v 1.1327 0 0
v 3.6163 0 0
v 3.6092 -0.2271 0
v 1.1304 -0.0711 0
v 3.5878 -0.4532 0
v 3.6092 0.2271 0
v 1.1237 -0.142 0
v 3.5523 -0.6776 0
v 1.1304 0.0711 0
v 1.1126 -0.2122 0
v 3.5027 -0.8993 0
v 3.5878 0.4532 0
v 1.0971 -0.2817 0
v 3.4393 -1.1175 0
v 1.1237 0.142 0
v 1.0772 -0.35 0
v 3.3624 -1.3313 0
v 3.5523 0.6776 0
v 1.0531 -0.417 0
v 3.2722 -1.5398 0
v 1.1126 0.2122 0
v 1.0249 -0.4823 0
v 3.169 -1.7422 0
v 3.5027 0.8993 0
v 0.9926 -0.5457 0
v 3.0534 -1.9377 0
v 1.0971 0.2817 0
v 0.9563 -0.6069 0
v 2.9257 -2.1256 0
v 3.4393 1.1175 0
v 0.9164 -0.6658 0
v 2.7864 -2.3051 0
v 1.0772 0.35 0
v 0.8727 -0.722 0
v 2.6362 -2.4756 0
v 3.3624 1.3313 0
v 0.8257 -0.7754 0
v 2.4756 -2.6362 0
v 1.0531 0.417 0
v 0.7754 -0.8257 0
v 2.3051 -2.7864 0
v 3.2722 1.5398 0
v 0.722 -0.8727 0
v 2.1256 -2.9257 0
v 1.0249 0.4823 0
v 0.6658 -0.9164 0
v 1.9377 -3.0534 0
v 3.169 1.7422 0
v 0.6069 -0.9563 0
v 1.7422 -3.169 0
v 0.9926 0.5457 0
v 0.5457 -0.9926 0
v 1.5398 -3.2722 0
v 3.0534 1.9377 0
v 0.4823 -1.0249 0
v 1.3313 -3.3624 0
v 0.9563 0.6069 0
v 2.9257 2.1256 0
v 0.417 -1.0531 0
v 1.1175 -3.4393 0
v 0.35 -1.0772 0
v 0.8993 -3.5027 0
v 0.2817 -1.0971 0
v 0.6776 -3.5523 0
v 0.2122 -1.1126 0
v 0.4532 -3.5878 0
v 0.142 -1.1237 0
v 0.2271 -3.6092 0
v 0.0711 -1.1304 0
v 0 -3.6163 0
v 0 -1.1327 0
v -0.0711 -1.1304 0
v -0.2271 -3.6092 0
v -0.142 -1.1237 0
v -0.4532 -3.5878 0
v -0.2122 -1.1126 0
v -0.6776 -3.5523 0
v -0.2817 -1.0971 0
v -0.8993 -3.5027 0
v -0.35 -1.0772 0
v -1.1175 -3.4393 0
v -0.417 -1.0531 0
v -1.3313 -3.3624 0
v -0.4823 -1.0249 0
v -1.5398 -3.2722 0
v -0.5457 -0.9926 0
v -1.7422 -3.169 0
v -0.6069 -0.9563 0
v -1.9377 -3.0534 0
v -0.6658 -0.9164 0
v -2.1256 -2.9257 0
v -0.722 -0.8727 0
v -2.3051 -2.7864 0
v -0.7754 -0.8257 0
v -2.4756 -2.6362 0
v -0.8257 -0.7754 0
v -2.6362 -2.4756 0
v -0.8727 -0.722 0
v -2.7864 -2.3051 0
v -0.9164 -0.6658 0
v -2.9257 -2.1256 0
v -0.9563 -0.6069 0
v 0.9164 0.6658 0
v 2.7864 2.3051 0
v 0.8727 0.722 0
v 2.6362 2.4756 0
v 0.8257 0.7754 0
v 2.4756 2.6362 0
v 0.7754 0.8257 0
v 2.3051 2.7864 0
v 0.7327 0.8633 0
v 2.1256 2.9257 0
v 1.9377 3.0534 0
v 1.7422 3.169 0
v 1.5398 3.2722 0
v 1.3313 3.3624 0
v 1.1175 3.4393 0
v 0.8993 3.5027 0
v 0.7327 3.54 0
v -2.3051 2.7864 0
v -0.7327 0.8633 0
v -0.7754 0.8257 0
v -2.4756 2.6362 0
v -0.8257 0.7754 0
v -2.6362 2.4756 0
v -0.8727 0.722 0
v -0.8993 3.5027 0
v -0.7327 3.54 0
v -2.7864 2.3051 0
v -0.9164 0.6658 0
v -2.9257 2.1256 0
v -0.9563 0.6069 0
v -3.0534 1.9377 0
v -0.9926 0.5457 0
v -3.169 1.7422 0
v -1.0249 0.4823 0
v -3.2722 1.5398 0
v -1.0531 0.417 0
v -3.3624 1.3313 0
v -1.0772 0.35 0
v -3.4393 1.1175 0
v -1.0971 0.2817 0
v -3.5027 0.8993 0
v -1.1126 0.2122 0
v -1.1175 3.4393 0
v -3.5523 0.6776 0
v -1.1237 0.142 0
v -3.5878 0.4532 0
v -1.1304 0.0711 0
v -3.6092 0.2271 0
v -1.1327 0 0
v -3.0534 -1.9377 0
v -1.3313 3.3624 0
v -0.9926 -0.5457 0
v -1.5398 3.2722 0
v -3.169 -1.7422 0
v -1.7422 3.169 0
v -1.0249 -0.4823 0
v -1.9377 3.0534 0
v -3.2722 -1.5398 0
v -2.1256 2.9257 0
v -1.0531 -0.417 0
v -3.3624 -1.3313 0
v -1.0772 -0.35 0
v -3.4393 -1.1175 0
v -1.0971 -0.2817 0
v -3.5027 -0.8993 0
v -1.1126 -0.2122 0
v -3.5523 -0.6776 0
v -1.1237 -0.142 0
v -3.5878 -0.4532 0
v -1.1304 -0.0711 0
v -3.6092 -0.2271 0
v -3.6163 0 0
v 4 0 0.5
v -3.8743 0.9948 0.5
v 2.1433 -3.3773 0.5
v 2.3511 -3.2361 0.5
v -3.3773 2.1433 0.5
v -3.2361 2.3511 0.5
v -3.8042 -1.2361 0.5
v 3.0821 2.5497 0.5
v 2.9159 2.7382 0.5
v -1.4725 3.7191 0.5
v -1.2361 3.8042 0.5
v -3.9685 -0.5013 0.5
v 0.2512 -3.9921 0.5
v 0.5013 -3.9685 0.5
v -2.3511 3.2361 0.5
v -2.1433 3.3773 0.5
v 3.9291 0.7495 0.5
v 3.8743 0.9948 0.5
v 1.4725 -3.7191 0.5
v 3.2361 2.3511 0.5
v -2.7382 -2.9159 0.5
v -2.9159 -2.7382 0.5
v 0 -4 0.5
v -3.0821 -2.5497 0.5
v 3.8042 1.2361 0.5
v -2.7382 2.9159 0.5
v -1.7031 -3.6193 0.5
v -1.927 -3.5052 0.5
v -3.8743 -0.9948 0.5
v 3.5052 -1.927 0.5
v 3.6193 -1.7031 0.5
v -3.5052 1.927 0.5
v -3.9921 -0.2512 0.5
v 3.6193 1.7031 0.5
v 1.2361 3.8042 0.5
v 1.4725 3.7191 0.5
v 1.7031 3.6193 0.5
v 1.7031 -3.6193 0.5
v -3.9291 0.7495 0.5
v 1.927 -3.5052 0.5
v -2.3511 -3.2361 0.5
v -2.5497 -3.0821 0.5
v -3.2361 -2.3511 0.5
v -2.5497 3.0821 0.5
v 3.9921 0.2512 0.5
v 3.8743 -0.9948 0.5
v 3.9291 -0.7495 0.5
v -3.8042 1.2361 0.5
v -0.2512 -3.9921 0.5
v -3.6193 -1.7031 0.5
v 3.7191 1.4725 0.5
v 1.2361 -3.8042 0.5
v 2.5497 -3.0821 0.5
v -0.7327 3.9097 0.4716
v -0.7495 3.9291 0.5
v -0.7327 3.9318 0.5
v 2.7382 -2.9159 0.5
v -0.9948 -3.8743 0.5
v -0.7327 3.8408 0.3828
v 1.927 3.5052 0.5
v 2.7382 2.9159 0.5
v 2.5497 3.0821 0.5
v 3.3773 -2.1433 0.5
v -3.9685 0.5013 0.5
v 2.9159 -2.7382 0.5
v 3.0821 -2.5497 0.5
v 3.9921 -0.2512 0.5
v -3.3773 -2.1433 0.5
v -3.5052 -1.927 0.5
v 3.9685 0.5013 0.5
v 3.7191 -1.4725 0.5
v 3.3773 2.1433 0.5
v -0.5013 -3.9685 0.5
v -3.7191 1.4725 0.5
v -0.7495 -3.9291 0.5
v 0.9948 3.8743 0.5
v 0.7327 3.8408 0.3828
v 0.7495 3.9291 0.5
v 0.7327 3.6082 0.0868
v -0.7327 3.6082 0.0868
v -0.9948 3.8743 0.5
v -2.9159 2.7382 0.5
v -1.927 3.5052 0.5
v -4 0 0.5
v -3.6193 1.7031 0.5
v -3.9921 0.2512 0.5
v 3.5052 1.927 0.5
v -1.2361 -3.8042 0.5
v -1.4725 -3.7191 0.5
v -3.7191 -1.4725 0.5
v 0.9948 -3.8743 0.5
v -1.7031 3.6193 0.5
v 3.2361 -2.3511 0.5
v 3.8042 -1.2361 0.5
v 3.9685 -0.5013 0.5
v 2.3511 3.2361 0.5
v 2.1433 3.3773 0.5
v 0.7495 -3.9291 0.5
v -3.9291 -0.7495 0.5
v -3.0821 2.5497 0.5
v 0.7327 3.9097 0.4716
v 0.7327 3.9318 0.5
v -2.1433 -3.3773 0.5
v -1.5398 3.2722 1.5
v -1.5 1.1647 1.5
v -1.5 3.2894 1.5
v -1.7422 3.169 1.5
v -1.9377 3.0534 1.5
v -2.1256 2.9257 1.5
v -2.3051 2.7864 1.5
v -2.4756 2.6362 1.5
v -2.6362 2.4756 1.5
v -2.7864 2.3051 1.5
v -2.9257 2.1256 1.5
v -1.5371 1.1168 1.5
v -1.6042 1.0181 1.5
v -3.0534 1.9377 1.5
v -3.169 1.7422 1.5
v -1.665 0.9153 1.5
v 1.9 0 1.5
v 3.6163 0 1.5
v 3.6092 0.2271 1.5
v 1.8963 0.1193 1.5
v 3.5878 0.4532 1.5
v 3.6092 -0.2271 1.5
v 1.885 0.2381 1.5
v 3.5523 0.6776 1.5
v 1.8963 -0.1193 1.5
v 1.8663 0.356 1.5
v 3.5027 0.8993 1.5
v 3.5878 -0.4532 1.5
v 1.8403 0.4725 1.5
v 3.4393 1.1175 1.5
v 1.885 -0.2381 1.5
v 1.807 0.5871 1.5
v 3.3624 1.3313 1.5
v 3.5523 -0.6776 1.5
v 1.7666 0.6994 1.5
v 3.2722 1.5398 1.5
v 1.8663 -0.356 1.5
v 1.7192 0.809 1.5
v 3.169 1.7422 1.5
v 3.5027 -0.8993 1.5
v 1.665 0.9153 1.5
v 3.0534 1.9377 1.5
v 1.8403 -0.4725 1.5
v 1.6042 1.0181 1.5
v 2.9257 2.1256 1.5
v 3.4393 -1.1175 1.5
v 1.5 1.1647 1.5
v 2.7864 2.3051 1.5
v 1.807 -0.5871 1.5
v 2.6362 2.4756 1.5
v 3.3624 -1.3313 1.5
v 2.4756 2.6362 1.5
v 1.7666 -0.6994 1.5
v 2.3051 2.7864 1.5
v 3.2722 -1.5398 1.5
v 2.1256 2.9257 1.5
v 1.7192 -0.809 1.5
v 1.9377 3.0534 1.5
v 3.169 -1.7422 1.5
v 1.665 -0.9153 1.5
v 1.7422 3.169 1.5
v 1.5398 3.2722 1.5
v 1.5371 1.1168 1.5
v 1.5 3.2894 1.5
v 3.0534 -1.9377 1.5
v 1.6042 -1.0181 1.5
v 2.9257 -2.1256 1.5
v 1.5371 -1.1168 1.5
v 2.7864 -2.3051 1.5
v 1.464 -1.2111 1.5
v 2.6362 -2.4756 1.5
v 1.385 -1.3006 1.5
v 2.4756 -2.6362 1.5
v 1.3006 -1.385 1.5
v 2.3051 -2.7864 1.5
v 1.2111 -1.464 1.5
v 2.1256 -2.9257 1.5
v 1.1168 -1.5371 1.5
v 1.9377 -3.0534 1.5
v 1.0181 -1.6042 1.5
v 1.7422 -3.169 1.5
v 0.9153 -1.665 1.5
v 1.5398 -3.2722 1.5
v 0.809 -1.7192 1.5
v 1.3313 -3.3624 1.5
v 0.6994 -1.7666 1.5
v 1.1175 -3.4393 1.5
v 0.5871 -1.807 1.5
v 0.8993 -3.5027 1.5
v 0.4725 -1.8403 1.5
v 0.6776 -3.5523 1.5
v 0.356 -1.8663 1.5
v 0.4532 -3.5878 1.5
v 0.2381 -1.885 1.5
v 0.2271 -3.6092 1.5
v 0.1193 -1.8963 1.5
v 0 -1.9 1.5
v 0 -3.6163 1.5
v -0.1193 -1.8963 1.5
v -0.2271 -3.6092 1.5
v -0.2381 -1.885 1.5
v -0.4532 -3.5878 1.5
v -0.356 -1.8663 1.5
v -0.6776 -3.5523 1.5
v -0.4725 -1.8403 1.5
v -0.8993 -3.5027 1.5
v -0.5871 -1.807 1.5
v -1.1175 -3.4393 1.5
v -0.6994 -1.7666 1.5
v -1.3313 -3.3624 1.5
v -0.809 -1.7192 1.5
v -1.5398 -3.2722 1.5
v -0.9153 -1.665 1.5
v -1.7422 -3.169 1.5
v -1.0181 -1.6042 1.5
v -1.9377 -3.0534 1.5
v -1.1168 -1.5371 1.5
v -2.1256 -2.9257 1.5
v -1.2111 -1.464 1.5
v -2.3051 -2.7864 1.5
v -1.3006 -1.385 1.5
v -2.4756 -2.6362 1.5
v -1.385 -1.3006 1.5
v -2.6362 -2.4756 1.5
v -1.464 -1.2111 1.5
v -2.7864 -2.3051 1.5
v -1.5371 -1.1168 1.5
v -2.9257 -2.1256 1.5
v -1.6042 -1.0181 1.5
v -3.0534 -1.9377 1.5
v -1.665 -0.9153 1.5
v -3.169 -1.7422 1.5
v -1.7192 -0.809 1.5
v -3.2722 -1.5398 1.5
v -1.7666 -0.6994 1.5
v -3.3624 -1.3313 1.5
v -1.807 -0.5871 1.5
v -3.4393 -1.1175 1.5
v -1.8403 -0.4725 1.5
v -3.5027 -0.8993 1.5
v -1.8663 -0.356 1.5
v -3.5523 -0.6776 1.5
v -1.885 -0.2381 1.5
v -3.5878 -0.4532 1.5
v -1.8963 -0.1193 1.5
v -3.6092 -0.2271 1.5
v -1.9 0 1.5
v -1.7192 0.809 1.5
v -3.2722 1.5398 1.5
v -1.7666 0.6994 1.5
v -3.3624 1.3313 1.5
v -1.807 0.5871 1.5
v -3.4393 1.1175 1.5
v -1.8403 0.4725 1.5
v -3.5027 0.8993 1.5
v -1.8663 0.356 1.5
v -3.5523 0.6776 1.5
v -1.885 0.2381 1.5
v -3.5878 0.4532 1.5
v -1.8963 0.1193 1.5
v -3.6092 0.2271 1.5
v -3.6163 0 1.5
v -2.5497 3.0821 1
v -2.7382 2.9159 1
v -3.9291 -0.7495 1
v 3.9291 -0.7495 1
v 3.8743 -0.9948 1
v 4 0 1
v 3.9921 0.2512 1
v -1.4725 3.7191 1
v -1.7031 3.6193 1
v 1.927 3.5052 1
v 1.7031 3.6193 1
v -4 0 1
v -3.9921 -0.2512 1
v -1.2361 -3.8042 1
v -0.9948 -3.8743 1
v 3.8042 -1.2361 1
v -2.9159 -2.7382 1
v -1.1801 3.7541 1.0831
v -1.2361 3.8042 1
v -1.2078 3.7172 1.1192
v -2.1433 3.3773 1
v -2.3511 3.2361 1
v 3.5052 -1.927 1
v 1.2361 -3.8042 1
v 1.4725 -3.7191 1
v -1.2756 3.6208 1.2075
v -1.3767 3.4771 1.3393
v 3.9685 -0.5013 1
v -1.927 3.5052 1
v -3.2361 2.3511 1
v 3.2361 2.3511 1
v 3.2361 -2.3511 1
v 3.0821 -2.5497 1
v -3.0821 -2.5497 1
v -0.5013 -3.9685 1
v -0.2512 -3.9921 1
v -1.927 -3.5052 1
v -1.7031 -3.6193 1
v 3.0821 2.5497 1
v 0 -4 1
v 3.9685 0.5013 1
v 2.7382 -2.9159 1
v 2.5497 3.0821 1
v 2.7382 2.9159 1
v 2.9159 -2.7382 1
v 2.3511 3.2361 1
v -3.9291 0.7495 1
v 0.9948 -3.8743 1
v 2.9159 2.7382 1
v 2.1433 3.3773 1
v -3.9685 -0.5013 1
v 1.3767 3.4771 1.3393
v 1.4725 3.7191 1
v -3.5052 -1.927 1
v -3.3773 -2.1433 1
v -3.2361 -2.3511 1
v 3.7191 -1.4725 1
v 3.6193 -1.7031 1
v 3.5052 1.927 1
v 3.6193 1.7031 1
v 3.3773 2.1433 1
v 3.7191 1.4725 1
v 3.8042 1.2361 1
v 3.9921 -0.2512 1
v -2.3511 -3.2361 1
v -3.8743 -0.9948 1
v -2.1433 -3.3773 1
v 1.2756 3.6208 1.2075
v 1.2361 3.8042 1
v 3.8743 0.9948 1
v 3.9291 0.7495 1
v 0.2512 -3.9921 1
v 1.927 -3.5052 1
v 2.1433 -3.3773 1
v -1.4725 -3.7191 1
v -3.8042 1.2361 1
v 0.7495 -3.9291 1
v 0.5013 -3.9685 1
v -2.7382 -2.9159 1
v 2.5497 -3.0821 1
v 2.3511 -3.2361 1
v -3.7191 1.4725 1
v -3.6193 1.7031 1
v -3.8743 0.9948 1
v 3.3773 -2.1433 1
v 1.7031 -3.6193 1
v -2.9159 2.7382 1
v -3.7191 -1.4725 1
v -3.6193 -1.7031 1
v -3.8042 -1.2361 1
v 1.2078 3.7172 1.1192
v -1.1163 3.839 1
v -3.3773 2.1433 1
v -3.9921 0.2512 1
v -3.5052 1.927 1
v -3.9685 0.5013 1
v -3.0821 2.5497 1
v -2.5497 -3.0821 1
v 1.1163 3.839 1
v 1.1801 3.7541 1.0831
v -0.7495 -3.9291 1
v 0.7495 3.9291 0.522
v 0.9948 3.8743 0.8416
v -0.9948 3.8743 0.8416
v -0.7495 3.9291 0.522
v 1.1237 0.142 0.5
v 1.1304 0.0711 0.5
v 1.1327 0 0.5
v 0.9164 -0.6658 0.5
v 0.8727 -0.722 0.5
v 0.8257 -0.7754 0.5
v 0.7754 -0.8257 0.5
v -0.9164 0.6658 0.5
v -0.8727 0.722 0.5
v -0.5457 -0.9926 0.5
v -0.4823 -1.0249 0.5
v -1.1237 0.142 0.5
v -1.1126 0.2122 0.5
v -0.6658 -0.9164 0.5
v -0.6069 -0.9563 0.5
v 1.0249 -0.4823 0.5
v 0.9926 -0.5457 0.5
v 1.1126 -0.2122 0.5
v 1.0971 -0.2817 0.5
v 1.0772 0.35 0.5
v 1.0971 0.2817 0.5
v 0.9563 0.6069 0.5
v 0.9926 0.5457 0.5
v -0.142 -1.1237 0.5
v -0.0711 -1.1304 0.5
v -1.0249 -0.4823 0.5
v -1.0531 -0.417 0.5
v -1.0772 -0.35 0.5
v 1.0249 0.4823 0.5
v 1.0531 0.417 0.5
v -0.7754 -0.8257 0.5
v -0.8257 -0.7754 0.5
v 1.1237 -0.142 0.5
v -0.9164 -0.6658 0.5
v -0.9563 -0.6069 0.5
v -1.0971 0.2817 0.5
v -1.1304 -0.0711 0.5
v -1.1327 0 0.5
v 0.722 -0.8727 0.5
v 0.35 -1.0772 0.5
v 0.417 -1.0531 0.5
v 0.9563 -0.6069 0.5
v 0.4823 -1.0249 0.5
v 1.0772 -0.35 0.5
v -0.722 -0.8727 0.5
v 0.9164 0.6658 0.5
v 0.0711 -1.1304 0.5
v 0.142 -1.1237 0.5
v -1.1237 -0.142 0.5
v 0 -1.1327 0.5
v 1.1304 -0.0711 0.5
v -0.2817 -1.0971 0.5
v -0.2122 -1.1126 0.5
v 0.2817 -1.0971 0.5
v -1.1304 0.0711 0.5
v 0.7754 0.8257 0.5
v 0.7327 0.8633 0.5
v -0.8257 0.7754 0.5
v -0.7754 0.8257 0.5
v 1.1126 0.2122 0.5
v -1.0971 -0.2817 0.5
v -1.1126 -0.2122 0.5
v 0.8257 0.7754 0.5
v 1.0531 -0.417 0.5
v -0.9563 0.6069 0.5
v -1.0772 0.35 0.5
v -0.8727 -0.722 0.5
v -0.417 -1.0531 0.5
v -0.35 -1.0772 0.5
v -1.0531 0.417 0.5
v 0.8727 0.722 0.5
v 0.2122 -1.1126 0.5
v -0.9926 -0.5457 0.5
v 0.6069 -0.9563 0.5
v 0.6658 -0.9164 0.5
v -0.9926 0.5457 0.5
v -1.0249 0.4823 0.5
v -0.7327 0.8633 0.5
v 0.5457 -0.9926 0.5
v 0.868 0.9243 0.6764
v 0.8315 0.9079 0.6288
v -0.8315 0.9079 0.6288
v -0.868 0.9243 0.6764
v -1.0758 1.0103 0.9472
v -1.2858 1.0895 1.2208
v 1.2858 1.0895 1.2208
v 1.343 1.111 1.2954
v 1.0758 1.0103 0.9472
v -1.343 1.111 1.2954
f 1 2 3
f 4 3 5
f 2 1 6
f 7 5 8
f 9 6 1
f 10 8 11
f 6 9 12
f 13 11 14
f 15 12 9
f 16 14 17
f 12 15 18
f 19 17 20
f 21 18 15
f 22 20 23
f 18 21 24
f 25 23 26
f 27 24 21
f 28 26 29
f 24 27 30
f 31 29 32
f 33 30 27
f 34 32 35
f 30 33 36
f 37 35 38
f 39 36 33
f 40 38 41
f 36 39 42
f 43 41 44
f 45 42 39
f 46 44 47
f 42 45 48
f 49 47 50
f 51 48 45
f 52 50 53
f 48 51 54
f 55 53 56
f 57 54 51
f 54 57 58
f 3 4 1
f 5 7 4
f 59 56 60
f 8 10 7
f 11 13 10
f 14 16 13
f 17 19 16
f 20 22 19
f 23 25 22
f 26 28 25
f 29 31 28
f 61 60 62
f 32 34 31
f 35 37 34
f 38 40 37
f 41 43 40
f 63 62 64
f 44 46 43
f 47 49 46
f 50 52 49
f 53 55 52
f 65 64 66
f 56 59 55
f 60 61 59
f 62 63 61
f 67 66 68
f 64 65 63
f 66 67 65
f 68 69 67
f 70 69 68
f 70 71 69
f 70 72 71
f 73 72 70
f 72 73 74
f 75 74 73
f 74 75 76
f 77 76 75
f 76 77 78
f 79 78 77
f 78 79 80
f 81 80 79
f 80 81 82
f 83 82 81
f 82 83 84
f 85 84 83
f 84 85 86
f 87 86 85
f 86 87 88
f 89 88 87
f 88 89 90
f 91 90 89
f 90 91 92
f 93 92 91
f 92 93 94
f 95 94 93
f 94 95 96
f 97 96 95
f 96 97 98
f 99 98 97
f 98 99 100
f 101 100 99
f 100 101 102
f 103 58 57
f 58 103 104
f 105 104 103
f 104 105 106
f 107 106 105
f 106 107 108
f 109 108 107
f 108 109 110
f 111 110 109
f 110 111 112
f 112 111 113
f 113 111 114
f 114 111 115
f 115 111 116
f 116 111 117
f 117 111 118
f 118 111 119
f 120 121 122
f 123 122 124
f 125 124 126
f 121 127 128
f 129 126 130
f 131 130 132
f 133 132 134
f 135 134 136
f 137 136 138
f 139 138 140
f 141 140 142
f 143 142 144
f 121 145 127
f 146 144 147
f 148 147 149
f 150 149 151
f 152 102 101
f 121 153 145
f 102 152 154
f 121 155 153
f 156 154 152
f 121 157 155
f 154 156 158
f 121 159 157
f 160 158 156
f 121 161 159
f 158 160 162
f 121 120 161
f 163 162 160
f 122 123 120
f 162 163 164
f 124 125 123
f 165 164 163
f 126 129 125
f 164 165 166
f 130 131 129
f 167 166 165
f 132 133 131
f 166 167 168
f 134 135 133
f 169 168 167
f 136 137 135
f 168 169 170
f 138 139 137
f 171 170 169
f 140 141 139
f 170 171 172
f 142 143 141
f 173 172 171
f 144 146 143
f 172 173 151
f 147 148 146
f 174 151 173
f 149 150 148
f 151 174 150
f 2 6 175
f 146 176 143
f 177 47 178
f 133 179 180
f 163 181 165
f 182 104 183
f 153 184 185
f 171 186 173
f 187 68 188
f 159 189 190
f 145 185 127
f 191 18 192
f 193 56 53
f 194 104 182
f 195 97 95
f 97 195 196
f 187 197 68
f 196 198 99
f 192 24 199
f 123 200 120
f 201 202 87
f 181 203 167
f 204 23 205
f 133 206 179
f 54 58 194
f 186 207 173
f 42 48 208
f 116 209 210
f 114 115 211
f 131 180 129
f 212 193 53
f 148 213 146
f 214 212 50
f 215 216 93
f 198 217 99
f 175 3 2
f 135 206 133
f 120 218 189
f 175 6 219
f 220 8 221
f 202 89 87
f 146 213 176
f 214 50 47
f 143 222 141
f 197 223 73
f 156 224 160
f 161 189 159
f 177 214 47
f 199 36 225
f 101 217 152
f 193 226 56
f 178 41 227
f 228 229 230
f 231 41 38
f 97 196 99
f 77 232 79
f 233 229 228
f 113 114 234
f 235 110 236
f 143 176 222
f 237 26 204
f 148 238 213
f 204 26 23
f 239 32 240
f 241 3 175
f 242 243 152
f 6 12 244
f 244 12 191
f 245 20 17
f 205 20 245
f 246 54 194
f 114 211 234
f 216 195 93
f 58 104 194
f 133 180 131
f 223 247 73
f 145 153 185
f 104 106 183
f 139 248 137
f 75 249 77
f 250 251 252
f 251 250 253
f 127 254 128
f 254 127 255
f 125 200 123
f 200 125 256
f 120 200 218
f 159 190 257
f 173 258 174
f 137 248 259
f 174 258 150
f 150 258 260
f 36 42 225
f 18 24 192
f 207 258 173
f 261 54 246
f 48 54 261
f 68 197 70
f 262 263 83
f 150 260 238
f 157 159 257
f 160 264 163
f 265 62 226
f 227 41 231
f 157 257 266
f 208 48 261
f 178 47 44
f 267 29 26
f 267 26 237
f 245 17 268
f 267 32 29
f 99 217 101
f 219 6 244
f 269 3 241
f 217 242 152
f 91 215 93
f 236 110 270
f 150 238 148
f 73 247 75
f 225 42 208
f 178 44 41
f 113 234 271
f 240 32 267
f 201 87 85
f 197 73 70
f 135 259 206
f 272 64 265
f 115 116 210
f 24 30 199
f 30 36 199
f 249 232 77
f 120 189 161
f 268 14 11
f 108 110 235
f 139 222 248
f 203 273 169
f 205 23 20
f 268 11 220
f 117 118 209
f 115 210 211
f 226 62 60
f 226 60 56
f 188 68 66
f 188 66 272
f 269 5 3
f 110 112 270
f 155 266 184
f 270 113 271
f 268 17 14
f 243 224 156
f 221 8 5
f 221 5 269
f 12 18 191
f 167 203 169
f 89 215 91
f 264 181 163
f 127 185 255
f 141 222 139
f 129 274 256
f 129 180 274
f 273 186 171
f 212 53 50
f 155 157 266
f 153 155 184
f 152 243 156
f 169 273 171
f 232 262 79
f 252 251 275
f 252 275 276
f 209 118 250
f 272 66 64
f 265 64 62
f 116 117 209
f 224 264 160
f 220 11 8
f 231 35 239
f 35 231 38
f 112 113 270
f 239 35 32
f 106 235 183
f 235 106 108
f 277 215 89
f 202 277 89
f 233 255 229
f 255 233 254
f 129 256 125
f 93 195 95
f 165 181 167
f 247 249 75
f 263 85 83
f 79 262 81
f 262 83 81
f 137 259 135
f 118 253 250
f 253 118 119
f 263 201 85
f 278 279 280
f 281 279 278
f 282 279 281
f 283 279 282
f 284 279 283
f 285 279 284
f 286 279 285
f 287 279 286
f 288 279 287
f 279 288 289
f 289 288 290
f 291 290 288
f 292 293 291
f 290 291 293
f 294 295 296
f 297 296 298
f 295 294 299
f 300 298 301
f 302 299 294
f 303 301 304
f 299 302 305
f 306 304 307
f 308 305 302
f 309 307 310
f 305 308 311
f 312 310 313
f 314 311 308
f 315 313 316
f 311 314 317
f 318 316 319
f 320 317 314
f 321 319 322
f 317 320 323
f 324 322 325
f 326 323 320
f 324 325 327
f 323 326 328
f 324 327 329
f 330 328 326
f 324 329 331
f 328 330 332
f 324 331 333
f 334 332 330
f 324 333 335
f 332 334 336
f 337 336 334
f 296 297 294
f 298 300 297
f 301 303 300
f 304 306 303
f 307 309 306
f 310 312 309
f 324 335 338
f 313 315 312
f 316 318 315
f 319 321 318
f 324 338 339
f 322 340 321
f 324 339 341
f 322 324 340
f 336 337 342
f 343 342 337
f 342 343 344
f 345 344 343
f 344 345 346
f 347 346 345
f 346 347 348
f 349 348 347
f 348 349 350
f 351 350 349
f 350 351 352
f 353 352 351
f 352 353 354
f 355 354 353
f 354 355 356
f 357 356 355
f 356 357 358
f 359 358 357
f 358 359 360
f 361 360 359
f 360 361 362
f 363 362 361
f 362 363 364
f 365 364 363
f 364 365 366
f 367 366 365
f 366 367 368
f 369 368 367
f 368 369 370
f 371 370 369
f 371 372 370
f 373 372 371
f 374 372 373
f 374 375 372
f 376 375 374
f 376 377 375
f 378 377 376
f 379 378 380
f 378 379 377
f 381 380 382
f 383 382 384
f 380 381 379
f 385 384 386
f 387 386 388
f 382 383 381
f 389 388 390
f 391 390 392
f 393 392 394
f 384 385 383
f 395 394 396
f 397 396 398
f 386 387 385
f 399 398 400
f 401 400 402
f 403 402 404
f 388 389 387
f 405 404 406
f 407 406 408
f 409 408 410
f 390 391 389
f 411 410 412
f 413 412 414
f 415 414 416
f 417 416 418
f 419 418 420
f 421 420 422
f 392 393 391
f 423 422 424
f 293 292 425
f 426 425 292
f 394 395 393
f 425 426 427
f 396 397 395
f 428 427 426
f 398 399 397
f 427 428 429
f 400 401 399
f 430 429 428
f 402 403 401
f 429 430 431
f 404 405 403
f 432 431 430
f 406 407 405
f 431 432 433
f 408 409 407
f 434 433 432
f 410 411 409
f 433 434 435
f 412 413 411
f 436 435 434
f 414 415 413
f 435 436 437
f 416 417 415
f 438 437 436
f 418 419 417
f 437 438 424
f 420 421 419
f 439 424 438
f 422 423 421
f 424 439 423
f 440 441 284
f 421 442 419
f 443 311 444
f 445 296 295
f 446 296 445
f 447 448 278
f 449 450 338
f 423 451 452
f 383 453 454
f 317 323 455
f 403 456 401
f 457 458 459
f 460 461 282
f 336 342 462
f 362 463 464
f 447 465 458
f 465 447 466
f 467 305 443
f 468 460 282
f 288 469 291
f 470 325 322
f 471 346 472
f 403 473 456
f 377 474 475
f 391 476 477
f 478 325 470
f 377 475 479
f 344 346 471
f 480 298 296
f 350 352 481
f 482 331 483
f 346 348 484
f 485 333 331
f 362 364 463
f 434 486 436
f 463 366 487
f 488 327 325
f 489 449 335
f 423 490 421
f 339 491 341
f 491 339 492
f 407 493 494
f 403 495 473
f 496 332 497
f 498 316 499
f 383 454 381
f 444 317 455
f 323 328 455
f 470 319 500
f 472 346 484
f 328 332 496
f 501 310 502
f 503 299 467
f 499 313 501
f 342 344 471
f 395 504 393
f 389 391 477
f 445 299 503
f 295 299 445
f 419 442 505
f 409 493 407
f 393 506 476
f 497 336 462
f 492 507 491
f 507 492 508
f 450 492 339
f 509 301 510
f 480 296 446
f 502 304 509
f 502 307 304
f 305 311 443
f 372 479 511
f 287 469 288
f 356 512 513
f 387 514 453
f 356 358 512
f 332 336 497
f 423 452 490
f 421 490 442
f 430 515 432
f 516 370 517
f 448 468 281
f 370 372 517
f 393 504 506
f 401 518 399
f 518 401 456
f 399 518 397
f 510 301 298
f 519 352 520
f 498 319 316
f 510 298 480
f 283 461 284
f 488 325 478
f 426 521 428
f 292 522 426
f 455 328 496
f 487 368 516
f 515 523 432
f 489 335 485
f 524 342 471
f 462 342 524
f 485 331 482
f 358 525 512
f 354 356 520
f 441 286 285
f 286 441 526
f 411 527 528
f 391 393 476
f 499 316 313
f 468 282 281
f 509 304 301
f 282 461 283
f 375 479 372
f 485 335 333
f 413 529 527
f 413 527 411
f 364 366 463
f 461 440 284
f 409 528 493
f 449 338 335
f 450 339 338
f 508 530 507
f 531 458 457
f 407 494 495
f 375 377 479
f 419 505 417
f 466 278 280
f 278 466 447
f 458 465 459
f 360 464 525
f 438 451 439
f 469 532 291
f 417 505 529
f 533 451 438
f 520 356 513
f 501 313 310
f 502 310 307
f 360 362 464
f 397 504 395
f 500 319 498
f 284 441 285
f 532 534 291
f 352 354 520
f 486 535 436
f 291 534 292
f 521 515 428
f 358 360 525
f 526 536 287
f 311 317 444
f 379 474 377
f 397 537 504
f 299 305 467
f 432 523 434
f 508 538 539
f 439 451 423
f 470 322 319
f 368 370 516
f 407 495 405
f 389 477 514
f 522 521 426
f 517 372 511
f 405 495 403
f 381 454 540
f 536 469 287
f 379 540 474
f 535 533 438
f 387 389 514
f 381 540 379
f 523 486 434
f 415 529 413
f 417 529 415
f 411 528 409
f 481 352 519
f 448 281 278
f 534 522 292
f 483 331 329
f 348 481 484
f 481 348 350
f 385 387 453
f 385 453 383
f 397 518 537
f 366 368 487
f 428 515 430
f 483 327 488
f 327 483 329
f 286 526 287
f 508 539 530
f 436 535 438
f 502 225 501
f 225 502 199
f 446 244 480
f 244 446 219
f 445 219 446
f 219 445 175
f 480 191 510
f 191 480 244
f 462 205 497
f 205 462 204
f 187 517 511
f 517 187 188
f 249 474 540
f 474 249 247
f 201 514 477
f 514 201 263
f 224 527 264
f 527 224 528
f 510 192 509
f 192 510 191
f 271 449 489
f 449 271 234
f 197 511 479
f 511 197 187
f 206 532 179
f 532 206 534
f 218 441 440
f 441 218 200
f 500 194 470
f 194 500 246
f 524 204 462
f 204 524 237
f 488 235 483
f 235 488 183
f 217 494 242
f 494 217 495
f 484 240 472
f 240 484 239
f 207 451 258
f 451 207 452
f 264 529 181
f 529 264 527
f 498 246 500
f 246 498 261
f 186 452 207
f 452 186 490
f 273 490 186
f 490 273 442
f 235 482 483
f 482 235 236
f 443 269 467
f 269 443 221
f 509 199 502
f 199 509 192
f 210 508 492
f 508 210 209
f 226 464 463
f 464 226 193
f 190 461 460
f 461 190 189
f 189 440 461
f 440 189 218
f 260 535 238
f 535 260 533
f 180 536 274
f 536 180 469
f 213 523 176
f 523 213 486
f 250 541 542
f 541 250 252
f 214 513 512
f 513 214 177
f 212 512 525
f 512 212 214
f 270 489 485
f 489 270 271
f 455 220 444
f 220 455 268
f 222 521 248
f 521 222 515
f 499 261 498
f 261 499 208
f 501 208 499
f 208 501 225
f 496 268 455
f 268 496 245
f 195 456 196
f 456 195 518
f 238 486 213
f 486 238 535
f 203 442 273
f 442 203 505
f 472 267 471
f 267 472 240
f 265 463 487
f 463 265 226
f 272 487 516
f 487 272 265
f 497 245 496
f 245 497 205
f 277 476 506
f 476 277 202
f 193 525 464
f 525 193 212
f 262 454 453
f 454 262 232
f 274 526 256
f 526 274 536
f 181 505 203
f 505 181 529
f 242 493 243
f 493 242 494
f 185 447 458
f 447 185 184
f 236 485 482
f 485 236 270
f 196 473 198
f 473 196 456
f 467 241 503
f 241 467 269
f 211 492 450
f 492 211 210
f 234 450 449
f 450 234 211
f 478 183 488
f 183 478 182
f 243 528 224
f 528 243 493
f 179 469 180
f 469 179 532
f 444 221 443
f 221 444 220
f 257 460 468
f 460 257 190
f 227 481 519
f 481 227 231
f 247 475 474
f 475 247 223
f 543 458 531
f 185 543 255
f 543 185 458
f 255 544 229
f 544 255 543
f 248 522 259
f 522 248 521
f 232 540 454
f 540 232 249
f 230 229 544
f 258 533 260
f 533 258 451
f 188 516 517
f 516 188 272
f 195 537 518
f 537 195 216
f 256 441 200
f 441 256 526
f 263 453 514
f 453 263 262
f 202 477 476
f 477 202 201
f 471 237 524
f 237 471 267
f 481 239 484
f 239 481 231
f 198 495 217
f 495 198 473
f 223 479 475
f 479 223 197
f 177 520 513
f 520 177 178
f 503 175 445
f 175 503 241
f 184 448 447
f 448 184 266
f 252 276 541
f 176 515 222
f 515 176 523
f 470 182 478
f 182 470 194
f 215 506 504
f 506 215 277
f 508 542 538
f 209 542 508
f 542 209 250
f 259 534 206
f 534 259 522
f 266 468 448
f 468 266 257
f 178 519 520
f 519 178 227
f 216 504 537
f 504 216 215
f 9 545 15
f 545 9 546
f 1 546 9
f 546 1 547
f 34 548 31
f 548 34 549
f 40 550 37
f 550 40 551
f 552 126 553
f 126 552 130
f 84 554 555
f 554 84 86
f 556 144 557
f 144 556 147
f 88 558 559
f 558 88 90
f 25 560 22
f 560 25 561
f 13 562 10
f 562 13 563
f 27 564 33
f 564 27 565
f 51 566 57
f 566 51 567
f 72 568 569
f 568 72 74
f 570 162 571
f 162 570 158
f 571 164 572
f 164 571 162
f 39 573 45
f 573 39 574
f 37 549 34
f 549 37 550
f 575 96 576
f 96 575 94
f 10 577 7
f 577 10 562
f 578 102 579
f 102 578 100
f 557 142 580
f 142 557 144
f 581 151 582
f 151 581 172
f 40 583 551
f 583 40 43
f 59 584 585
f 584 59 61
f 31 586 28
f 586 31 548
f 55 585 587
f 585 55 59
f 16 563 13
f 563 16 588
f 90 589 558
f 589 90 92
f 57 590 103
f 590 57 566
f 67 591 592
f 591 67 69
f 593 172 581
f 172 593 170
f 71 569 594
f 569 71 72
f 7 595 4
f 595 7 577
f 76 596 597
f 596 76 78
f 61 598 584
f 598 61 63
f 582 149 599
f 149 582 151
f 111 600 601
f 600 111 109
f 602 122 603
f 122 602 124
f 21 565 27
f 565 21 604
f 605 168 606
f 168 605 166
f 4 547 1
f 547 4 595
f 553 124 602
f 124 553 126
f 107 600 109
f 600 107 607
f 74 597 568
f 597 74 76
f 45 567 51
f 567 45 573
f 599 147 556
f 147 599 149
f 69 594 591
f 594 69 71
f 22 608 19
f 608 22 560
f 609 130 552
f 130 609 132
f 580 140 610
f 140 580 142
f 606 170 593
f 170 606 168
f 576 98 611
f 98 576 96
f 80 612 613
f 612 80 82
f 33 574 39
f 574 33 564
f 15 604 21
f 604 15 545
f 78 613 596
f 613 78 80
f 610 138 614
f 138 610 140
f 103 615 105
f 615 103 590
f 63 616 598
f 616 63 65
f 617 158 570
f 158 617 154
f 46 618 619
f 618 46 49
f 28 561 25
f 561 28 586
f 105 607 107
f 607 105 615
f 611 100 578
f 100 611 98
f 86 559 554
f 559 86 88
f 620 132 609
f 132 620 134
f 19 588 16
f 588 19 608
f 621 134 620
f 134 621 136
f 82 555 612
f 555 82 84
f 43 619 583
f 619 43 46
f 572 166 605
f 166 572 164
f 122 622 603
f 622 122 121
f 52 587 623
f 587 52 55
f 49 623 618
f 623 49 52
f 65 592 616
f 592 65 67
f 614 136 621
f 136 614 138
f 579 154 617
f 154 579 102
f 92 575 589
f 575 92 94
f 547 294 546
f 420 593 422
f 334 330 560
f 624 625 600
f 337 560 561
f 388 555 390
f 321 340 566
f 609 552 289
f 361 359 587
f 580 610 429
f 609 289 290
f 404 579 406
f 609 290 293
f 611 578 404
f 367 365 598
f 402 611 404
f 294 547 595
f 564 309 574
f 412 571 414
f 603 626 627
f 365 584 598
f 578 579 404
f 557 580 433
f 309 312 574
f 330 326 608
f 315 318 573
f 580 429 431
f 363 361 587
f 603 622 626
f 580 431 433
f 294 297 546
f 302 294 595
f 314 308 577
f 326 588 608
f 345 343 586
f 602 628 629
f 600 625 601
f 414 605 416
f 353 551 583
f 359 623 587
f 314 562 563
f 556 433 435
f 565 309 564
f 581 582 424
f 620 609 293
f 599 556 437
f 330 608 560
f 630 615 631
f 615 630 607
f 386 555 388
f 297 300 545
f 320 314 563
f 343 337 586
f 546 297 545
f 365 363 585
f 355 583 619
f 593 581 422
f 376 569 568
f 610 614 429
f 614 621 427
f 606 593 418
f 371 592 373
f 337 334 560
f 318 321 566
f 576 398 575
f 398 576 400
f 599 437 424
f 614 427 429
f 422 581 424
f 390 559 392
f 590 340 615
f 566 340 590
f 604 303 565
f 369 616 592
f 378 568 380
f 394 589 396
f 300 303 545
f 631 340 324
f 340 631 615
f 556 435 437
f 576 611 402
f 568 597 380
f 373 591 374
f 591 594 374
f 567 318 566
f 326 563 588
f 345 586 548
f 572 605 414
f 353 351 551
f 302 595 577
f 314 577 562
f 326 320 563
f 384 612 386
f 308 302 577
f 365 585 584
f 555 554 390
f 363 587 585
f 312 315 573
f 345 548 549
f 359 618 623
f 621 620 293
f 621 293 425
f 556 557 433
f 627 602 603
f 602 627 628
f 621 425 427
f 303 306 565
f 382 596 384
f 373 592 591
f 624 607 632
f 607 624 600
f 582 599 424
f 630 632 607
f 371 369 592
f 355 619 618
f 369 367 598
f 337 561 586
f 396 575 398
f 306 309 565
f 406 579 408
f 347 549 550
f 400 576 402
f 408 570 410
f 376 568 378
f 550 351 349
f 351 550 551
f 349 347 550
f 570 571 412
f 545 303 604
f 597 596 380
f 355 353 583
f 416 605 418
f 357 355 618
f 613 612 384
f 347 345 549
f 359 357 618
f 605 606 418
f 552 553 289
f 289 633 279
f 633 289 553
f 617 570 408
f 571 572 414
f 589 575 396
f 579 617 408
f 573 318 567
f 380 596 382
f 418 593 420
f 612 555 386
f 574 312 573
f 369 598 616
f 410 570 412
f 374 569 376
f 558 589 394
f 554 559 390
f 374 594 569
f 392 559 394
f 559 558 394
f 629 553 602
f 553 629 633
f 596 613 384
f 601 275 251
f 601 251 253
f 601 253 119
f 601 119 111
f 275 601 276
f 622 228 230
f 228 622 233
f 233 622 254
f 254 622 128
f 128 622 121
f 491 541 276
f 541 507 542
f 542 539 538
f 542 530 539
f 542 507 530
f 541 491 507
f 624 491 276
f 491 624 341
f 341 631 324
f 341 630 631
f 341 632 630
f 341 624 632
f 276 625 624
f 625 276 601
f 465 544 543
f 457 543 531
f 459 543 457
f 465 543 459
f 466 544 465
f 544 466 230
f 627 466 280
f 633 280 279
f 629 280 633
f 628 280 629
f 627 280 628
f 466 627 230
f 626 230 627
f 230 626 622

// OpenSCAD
//Outer radius of the peg the clip will attach to
pegRadius = 1.75;
//Clearance between the peg and the inner radius of the clip
clearance = .15;
//Outer radius of the clip.  If it's less than or equal to your peg radius, your clip isn't going to hold much.
outerRadius = 4;
//Thickness of the clip.
thickness = 1.5;
//Bevel angle from vertical of the clip and peg notch.  The steeper the angle, the more holding power and thinner notch in your peg, but the harder it is to print the peg without support.  Supports are bad.
bevelAngle = 37.5;
//Thickness of the clip before it starts beveling.  This can be 0 for a sharp-edged clip, or greater than the thickness for a clip with no bevel at all.
bevelStart = .5;
//This is how much the "wings" overlap the solid portion of the peg.  Too much and your clip may not be flexible enough to open and go into place.  Less than clearance and the clip can just fall off.  You only need enough wraparound to keep the clip from coming off during normal useage and still be removable by hand (or tool).
wrapAround = .4;
//This chamfers the outside edge, easing the top and bottom corners and making removal from the bed easier.
chamferAngle = 37.5;
chamferHeight = .5;

offset = ((thickness-bevelStart) / tan((90-bevelAngle)));

innerRadius = (pegRadius - offset) + clearance;
iR2 = innerRadius + offset;
//1.56321 - .1;

chamferWidth = (chamferHeight) / tan(90-chamferAngle);

//Number of sides to make it "round".  I like very round, so I use 100, but less round renders faster.
$fn=100;

//jump = 10*ceil(outerRadius * 3 / 10);

difference() {
	cylinder(
		h=thickness,
		r=outerRadius
	);
	cylinder(
		h=thickness,
		r=innerRadius
	);
	translate([0, 0, bevelStart]){
		cylinder(
			h=thickness - bevelStart,
			r1=innerRadius,
			r2=iR2
		);
	};
	translate([0, outerRadius/2, thickness/2]) {
		cube(
			size=[(innerRadius-wrapAround)*2,outerRadius,thickness],
			center=true
		);
	};
	polyhedron(
		points=[
			[-(innerRadius-wrapAround), 0, bevelStart],
			[-(innerRadius-wrapAround + offset), 0, thickness],
			[(innerRadius-wrapAround)+offset, 0, thickness],
			[innerRadius-wrapAround, 0, bevelStart],
			[-(innerRadius-wrapAround), outerRadius, bevelStart],
			[-(innerRadius-wrapAround + offset), outerRadius, thickness],
			[(innerRadius-wrapAround)+offset, outerRadius, thickness],
			[innerRadius-wrapAround, outerRadius, bevelStart]
		],
		faces=[
			[0,1,2,3],
			[7,6,5,4],
			[1,5,6,2],
			[3,7,4,0],
			[0,4,5,1],
			[2,6,7,3]
		]
	);
	difference() {
		cylinder(
			h=chamferHeight,
			r=outerRadius*2
		);
		cylinder(
			h=chamferHeight,
			r1=outerRadius - chamferWidth,
			r2=outerRadius
		);
	};
	translate([0,0,thickness-chamferHeight]) {
		difference() {
			cylinder(
				h=chamferHeight,
				r=outerRadius*2
			);
			cylinder(
				h=chamferHeight,
				r1=outerRadius,
				r2=outerRadius - chamferWidth
			);
		}
	};
}
